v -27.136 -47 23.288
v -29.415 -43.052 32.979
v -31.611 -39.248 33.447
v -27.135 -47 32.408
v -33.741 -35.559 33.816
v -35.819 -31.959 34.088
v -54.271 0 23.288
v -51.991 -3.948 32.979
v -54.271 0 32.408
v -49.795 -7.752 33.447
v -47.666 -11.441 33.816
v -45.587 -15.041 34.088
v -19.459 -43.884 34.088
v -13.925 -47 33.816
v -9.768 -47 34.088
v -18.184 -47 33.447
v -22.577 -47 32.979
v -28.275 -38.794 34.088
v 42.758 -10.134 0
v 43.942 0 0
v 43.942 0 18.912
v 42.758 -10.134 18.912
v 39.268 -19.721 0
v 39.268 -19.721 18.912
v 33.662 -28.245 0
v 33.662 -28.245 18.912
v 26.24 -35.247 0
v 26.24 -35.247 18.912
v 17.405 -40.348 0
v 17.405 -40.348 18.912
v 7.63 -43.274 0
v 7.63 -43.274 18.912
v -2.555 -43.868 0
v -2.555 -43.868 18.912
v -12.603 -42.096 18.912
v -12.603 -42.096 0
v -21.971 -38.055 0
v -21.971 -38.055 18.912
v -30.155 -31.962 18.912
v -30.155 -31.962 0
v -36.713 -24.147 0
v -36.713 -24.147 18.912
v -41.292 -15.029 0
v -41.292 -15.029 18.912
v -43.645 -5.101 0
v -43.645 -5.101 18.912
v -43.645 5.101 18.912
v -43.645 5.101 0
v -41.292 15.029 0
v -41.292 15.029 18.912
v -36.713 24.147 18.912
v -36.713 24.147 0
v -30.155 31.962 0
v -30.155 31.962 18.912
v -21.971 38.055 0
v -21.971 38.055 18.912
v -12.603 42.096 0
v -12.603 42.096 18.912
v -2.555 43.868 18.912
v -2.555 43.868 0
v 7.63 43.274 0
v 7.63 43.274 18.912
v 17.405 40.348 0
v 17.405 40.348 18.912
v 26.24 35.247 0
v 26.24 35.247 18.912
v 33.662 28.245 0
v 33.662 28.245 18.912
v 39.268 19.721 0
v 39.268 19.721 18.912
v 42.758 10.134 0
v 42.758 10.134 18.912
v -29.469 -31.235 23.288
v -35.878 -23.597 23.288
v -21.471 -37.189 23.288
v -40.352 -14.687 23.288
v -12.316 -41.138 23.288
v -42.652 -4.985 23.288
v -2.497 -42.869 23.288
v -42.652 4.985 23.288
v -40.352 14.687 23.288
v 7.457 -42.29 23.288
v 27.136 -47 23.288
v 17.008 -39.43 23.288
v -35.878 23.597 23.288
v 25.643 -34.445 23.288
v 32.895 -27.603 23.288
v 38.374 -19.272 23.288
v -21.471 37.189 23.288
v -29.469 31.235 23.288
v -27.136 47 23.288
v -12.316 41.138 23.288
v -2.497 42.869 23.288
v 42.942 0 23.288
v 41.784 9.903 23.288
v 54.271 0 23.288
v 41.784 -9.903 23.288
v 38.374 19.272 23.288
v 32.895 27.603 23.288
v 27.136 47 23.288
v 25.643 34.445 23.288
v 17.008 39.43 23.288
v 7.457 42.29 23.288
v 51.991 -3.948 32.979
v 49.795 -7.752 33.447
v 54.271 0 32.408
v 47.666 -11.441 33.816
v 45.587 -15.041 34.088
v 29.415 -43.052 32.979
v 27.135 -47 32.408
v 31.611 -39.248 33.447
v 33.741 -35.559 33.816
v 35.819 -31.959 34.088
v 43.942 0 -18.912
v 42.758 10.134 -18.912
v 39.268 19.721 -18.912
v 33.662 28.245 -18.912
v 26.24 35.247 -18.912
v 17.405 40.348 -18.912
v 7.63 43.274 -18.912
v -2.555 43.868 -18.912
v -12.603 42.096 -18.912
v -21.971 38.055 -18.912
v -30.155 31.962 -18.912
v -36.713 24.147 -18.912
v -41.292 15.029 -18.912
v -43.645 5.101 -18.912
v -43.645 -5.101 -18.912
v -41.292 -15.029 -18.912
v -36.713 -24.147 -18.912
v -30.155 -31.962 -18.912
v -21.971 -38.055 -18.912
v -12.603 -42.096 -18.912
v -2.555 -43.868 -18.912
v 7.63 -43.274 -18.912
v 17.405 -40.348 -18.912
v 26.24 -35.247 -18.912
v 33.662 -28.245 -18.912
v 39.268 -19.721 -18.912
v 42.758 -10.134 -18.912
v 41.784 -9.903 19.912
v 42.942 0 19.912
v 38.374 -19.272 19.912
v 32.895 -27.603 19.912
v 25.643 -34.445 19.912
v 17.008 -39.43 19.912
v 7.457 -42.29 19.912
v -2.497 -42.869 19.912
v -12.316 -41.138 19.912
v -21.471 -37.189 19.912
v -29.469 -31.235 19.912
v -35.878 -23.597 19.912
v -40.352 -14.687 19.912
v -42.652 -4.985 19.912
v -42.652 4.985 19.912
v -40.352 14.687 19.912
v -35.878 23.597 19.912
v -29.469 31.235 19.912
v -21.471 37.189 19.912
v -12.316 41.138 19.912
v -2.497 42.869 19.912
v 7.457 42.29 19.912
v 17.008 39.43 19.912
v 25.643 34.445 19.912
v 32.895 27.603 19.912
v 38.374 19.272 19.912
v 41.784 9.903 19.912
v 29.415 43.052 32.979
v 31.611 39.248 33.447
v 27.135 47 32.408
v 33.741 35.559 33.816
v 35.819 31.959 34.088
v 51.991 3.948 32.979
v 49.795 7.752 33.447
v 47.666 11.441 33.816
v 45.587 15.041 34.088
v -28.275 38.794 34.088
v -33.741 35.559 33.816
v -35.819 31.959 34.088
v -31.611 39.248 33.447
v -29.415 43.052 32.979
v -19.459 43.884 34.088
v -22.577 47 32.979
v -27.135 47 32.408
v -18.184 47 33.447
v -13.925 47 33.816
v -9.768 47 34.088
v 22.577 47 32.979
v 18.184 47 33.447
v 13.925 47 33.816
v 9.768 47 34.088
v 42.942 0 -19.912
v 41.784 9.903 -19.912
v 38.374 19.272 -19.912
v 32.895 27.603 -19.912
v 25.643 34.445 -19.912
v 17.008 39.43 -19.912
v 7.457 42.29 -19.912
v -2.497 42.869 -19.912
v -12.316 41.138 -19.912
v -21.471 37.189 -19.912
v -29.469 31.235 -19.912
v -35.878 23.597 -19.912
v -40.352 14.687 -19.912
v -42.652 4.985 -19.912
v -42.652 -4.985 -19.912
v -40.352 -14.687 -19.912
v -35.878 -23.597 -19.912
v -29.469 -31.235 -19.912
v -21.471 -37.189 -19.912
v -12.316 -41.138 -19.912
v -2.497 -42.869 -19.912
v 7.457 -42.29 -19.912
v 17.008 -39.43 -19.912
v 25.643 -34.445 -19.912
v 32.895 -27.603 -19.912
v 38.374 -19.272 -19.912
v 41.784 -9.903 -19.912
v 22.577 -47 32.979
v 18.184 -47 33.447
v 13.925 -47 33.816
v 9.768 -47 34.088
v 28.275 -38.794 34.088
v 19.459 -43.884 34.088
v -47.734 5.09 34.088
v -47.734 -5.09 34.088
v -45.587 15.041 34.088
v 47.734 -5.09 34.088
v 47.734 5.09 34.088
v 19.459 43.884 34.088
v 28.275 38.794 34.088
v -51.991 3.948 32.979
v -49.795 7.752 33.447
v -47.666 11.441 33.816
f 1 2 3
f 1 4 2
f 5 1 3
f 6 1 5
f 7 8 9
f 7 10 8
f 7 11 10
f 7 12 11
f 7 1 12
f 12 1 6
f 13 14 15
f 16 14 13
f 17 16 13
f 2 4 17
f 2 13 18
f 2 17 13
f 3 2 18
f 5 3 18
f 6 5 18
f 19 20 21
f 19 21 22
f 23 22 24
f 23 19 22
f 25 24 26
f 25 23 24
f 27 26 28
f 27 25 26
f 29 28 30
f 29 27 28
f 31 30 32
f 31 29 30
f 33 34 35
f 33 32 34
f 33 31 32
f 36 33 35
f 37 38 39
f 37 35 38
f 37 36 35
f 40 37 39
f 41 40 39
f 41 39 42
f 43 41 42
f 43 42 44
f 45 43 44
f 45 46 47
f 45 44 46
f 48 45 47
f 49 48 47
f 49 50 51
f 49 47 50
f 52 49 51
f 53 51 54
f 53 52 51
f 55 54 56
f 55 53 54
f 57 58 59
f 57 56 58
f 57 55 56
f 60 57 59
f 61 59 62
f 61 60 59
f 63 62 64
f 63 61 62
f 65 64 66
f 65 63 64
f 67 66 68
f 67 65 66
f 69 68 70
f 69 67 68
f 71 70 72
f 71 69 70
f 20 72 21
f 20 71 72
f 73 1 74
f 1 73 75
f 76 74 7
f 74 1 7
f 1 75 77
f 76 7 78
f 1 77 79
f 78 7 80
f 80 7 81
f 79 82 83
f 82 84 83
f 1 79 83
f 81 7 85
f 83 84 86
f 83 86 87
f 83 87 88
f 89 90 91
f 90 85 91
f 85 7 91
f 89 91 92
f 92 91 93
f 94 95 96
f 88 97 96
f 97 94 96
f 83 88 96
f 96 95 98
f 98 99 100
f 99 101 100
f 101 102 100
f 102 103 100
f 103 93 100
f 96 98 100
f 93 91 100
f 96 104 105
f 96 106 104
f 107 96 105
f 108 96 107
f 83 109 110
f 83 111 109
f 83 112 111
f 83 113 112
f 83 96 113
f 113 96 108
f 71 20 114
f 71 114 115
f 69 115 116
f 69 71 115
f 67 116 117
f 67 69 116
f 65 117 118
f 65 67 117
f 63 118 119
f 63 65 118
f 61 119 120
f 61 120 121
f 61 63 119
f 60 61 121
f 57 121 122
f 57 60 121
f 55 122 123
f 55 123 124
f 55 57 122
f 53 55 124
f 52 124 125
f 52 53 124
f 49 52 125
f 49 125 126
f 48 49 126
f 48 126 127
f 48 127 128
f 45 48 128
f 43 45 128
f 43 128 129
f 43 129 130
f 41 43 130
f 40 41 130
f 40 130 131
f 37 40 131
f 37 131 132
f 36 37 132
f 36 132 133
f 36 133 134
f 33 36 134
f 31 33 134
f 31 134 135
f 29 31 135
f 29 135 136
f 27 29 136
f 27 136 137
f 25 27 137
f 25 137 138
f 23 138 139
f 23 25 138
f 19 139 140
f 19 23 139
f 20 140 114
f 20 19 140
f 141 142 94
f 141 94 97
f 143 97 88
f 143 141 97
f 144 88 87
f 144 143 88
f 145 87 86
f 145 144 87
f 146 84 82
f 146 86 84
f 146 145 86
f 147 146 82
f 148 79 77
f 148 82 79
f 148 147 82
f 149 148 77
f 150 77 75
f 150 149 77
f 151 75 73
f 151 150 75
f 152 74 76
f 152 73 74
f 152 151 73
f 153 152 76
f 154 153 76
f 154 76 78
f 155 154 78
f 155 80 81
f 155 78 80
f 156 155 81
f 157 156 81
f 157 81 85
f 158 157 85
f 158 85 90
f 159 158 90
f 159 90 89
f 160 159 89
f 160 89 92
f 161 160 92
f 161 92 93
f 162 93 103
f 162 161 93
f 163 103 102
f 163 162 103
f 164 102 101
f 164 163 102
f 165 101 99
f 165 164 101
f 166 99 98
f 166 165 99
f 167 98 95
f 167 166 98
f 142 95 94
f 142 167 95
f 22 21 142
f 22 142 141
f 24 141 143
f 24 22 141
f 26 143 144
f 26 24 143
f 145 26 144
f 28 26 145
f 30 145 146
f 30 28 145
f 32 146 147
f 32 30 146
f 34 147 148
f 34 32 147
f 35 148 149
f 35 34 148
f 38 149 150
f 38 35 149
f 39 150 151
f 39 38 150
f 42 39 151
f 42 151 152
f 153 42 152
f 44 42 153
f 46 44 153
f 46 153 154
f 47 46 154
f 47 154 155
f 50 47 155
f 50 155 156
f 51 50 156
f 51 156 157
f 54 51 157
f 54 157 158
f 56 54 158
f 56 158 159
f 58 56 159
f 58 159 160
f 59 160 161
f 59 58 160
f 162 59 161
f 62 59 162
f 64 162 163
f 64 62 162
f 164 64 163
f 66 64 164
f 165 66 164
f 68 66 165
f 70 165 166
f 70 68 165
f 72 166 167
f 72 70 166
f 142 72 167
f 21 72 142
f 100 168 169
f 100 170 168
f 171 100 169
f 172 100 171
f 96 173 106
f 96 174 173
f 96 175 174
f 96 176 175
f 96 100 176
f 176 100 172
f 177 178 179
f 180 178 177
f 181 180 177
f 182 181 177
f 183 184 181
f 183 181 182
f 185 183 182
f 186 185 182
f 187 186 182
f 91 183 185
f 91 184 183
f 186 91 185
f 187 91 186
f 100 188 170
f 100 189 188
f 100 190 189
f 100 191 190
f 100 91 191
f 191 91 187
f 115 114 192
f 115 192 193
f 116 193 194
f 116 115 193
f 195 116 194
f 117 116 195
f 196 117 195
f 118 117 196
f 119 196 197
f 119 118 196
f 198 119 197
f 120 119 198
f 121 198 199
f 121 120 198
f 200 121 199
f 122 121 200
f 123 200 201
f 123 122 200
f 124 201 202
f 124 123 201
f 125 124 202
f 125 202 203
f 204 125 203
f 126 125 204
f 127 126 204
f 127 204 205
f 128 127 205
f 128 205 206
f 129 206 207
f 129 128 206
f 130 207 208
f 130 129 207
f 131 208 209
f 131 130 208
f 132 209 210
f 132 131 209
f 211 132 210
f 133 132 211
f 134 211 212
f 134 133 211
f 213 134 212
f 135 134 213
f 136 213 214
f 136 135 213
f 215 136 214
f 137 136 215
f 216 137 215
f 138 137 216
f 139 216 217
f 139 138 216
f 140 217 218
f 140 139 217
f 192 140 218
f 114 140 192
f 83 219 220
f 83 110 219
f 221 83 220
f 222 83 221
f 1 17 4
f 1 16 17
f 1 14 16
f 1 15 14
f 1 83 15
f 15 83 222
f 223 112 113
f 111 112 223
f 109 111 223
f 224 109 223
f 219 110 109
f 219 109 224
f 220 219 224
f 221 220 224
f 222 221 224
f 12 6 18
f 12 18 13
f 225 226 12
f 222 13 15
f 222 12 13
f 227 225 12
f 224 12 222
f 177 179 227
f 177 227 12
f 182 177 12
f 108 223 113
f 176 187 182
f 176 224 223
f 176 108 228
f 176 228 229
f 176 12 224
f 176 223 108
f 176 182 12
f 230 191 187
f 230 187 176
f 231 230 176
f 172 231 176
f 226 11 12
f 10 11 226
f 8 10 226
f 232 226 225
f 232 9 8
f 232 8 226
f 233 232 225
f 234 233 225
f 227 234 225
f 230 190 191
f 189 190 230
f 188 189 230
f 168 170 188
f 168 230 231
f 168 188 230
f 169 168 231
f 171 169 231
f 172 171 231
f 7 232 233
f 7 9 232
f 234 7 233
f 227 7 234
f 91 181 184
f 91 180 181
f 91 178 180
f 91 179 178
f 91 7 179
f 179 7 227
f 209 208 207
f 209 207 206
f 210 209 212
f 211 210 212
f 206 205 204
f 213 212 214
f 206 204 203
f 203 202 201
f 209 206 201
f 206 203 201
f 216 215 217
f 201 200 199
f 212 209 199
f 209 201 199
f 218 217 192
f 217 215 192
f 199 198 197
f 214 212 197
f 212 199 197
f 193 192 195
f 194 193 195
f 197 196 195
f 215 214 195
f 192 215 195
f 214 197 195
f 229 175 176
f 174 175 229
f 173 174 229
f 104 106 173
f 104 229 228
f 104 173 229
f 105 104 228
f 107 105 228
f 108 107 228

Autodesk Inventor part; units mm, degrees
ref_plane "YZ Plane" through (0, 0, 0) normal (1, 0, 0) x (0, 1, 0)
ref_plane "XZ Plane" through (0, 0, 0) normal (0, 1, 0) x (-1, 0, 0)
ref_plane "XY Plane" through (0, 0, 0) normal (0, 0, 1) x (1, 0, 0)
sketch "Szkic7" plane through (0, 0, 0) normal (0, 0, 1) x (1, 0, 0)
  circle A0 centre (0, 0) radius 43.942
  dimension "d35" = 87.884
extrude "Wyciągnięcie proste2" add sketch "Szkic7" along normal mid plane 39.825
chamfer "Faza2" distance 1 angle 45 1 edges at (-43.942, 0, 19.9125)
sketch "Szkic9" plane through (0, 0, 19.9125) normal (0, 0, 1) x (1, 0, 0)
  circle A0 centre (0, 0) radius 42.942 projected
extrude "Wyciągnięcie proste3" add sketch "Szkic9" along normal blind 3.375
sketch "Szkic10" plane through (0, 0, 23.2875) normal (0, 0, 1) x (1, 0, 0)
  line L0 (-27.1355, 47) -> (27.1355, 47)
  line L1 (27.1355, 47) -> (54.2709, 0)
  line L2 (54.2709, 0) -> (27.1355, -47)
  line L3 (27.1355, -47) -> (-27.1355, -47)
  line L4 (-27.1355, -47) -> (-54.2709, 0)
  line L5 (-54.2709, 0) -> (-27.1355, 47)
  line L6 (0, 61.5188) -> (0, -61.5188) construction
  line L7 (-61.5188, 0) -> (61.5188, 0) construction
  point P0 (0, 0)
  point P1 (0, 0)
  point P2 (0, 47)
  dimension "d44" = 94
extrude "Wyciągnięcie proste4" add sketch "Szkic10" along normal blind 10.8
sketch "Szkic12" plane through (0, 0, 0) normal (0, 1, 0) x (-1, 0, 0)
  line L0 (0, -2.1463) -> (0, 12.8775) construction
  line L1 (-27.1355, 23.2875) -> (-27.1355, 34.0875) construction
  line L2 (-54.2709, 34.0875) -> (-27.1355, 34.0875) construction
  line L3 (-54.2709, 23.2875) -> (-54.2709, 34.0875) projected
  line L4 (-54.2709, 32.4084) -> (-48.0043, 34.0875)
  line L5 (-54.2709, 34.0875) -> (-27.1355, 34.0875) projected
  line L6 (-54.2709, 23.2875) -> (-27.1355, 23.2875) projected
  point P0 (0, 0)
  dimension "d50" = 15
  dimension "d51" = 6.2667
revolve "Obrót2" cut sketch "Szkic12" angle 360 about axis through (0, 0, -10) along (0, 0, 1)
thread "Gwint3" size "G87.884x2.309" designation "G 3" class "A" standard "ISO Pipe Threads" full length
chamfer "Faza3" distance 1 angle 45 1 edges at (-43.942, 0, -19.9125)
equation "\"d35\" = OD"
equation "\"d36\" = 0.7375 * L"
equation "\"d42\" = 0.0625 * L"
equation "\"d44\" = SW"
equation "\"d45\" = 0.2 * L"
equation "\"d51\" = 0.0666667 * SW"
equation "\"SzerokośćGięciaPodcięcia\" = Grubość"
equation "\"RozmiarPodcięciaNarożnika\" = 4 * Grubość"
equation "\"PromieńPrzejścia\" = PromieńGięcia"
equation "\"Rozmiar_promienia_Jacobiego\" = PromieńGięcia"
equation "\"Wielk_odstępu\" = Grubość"
equation "\"d2\" = PromieńGięcia"
equation "\"d23\" = PromieńGięcia"
equation "\"OD\" = 87.884"
equation "\"SW\" = 94"
equation "\"L\" = 54"
equation "\"Grubość\" = 1.5"
equation "\"PromieńGięcia\" = 3"
properties part number "Korek sześciokątny BSP 3'' L=54" material "304"
